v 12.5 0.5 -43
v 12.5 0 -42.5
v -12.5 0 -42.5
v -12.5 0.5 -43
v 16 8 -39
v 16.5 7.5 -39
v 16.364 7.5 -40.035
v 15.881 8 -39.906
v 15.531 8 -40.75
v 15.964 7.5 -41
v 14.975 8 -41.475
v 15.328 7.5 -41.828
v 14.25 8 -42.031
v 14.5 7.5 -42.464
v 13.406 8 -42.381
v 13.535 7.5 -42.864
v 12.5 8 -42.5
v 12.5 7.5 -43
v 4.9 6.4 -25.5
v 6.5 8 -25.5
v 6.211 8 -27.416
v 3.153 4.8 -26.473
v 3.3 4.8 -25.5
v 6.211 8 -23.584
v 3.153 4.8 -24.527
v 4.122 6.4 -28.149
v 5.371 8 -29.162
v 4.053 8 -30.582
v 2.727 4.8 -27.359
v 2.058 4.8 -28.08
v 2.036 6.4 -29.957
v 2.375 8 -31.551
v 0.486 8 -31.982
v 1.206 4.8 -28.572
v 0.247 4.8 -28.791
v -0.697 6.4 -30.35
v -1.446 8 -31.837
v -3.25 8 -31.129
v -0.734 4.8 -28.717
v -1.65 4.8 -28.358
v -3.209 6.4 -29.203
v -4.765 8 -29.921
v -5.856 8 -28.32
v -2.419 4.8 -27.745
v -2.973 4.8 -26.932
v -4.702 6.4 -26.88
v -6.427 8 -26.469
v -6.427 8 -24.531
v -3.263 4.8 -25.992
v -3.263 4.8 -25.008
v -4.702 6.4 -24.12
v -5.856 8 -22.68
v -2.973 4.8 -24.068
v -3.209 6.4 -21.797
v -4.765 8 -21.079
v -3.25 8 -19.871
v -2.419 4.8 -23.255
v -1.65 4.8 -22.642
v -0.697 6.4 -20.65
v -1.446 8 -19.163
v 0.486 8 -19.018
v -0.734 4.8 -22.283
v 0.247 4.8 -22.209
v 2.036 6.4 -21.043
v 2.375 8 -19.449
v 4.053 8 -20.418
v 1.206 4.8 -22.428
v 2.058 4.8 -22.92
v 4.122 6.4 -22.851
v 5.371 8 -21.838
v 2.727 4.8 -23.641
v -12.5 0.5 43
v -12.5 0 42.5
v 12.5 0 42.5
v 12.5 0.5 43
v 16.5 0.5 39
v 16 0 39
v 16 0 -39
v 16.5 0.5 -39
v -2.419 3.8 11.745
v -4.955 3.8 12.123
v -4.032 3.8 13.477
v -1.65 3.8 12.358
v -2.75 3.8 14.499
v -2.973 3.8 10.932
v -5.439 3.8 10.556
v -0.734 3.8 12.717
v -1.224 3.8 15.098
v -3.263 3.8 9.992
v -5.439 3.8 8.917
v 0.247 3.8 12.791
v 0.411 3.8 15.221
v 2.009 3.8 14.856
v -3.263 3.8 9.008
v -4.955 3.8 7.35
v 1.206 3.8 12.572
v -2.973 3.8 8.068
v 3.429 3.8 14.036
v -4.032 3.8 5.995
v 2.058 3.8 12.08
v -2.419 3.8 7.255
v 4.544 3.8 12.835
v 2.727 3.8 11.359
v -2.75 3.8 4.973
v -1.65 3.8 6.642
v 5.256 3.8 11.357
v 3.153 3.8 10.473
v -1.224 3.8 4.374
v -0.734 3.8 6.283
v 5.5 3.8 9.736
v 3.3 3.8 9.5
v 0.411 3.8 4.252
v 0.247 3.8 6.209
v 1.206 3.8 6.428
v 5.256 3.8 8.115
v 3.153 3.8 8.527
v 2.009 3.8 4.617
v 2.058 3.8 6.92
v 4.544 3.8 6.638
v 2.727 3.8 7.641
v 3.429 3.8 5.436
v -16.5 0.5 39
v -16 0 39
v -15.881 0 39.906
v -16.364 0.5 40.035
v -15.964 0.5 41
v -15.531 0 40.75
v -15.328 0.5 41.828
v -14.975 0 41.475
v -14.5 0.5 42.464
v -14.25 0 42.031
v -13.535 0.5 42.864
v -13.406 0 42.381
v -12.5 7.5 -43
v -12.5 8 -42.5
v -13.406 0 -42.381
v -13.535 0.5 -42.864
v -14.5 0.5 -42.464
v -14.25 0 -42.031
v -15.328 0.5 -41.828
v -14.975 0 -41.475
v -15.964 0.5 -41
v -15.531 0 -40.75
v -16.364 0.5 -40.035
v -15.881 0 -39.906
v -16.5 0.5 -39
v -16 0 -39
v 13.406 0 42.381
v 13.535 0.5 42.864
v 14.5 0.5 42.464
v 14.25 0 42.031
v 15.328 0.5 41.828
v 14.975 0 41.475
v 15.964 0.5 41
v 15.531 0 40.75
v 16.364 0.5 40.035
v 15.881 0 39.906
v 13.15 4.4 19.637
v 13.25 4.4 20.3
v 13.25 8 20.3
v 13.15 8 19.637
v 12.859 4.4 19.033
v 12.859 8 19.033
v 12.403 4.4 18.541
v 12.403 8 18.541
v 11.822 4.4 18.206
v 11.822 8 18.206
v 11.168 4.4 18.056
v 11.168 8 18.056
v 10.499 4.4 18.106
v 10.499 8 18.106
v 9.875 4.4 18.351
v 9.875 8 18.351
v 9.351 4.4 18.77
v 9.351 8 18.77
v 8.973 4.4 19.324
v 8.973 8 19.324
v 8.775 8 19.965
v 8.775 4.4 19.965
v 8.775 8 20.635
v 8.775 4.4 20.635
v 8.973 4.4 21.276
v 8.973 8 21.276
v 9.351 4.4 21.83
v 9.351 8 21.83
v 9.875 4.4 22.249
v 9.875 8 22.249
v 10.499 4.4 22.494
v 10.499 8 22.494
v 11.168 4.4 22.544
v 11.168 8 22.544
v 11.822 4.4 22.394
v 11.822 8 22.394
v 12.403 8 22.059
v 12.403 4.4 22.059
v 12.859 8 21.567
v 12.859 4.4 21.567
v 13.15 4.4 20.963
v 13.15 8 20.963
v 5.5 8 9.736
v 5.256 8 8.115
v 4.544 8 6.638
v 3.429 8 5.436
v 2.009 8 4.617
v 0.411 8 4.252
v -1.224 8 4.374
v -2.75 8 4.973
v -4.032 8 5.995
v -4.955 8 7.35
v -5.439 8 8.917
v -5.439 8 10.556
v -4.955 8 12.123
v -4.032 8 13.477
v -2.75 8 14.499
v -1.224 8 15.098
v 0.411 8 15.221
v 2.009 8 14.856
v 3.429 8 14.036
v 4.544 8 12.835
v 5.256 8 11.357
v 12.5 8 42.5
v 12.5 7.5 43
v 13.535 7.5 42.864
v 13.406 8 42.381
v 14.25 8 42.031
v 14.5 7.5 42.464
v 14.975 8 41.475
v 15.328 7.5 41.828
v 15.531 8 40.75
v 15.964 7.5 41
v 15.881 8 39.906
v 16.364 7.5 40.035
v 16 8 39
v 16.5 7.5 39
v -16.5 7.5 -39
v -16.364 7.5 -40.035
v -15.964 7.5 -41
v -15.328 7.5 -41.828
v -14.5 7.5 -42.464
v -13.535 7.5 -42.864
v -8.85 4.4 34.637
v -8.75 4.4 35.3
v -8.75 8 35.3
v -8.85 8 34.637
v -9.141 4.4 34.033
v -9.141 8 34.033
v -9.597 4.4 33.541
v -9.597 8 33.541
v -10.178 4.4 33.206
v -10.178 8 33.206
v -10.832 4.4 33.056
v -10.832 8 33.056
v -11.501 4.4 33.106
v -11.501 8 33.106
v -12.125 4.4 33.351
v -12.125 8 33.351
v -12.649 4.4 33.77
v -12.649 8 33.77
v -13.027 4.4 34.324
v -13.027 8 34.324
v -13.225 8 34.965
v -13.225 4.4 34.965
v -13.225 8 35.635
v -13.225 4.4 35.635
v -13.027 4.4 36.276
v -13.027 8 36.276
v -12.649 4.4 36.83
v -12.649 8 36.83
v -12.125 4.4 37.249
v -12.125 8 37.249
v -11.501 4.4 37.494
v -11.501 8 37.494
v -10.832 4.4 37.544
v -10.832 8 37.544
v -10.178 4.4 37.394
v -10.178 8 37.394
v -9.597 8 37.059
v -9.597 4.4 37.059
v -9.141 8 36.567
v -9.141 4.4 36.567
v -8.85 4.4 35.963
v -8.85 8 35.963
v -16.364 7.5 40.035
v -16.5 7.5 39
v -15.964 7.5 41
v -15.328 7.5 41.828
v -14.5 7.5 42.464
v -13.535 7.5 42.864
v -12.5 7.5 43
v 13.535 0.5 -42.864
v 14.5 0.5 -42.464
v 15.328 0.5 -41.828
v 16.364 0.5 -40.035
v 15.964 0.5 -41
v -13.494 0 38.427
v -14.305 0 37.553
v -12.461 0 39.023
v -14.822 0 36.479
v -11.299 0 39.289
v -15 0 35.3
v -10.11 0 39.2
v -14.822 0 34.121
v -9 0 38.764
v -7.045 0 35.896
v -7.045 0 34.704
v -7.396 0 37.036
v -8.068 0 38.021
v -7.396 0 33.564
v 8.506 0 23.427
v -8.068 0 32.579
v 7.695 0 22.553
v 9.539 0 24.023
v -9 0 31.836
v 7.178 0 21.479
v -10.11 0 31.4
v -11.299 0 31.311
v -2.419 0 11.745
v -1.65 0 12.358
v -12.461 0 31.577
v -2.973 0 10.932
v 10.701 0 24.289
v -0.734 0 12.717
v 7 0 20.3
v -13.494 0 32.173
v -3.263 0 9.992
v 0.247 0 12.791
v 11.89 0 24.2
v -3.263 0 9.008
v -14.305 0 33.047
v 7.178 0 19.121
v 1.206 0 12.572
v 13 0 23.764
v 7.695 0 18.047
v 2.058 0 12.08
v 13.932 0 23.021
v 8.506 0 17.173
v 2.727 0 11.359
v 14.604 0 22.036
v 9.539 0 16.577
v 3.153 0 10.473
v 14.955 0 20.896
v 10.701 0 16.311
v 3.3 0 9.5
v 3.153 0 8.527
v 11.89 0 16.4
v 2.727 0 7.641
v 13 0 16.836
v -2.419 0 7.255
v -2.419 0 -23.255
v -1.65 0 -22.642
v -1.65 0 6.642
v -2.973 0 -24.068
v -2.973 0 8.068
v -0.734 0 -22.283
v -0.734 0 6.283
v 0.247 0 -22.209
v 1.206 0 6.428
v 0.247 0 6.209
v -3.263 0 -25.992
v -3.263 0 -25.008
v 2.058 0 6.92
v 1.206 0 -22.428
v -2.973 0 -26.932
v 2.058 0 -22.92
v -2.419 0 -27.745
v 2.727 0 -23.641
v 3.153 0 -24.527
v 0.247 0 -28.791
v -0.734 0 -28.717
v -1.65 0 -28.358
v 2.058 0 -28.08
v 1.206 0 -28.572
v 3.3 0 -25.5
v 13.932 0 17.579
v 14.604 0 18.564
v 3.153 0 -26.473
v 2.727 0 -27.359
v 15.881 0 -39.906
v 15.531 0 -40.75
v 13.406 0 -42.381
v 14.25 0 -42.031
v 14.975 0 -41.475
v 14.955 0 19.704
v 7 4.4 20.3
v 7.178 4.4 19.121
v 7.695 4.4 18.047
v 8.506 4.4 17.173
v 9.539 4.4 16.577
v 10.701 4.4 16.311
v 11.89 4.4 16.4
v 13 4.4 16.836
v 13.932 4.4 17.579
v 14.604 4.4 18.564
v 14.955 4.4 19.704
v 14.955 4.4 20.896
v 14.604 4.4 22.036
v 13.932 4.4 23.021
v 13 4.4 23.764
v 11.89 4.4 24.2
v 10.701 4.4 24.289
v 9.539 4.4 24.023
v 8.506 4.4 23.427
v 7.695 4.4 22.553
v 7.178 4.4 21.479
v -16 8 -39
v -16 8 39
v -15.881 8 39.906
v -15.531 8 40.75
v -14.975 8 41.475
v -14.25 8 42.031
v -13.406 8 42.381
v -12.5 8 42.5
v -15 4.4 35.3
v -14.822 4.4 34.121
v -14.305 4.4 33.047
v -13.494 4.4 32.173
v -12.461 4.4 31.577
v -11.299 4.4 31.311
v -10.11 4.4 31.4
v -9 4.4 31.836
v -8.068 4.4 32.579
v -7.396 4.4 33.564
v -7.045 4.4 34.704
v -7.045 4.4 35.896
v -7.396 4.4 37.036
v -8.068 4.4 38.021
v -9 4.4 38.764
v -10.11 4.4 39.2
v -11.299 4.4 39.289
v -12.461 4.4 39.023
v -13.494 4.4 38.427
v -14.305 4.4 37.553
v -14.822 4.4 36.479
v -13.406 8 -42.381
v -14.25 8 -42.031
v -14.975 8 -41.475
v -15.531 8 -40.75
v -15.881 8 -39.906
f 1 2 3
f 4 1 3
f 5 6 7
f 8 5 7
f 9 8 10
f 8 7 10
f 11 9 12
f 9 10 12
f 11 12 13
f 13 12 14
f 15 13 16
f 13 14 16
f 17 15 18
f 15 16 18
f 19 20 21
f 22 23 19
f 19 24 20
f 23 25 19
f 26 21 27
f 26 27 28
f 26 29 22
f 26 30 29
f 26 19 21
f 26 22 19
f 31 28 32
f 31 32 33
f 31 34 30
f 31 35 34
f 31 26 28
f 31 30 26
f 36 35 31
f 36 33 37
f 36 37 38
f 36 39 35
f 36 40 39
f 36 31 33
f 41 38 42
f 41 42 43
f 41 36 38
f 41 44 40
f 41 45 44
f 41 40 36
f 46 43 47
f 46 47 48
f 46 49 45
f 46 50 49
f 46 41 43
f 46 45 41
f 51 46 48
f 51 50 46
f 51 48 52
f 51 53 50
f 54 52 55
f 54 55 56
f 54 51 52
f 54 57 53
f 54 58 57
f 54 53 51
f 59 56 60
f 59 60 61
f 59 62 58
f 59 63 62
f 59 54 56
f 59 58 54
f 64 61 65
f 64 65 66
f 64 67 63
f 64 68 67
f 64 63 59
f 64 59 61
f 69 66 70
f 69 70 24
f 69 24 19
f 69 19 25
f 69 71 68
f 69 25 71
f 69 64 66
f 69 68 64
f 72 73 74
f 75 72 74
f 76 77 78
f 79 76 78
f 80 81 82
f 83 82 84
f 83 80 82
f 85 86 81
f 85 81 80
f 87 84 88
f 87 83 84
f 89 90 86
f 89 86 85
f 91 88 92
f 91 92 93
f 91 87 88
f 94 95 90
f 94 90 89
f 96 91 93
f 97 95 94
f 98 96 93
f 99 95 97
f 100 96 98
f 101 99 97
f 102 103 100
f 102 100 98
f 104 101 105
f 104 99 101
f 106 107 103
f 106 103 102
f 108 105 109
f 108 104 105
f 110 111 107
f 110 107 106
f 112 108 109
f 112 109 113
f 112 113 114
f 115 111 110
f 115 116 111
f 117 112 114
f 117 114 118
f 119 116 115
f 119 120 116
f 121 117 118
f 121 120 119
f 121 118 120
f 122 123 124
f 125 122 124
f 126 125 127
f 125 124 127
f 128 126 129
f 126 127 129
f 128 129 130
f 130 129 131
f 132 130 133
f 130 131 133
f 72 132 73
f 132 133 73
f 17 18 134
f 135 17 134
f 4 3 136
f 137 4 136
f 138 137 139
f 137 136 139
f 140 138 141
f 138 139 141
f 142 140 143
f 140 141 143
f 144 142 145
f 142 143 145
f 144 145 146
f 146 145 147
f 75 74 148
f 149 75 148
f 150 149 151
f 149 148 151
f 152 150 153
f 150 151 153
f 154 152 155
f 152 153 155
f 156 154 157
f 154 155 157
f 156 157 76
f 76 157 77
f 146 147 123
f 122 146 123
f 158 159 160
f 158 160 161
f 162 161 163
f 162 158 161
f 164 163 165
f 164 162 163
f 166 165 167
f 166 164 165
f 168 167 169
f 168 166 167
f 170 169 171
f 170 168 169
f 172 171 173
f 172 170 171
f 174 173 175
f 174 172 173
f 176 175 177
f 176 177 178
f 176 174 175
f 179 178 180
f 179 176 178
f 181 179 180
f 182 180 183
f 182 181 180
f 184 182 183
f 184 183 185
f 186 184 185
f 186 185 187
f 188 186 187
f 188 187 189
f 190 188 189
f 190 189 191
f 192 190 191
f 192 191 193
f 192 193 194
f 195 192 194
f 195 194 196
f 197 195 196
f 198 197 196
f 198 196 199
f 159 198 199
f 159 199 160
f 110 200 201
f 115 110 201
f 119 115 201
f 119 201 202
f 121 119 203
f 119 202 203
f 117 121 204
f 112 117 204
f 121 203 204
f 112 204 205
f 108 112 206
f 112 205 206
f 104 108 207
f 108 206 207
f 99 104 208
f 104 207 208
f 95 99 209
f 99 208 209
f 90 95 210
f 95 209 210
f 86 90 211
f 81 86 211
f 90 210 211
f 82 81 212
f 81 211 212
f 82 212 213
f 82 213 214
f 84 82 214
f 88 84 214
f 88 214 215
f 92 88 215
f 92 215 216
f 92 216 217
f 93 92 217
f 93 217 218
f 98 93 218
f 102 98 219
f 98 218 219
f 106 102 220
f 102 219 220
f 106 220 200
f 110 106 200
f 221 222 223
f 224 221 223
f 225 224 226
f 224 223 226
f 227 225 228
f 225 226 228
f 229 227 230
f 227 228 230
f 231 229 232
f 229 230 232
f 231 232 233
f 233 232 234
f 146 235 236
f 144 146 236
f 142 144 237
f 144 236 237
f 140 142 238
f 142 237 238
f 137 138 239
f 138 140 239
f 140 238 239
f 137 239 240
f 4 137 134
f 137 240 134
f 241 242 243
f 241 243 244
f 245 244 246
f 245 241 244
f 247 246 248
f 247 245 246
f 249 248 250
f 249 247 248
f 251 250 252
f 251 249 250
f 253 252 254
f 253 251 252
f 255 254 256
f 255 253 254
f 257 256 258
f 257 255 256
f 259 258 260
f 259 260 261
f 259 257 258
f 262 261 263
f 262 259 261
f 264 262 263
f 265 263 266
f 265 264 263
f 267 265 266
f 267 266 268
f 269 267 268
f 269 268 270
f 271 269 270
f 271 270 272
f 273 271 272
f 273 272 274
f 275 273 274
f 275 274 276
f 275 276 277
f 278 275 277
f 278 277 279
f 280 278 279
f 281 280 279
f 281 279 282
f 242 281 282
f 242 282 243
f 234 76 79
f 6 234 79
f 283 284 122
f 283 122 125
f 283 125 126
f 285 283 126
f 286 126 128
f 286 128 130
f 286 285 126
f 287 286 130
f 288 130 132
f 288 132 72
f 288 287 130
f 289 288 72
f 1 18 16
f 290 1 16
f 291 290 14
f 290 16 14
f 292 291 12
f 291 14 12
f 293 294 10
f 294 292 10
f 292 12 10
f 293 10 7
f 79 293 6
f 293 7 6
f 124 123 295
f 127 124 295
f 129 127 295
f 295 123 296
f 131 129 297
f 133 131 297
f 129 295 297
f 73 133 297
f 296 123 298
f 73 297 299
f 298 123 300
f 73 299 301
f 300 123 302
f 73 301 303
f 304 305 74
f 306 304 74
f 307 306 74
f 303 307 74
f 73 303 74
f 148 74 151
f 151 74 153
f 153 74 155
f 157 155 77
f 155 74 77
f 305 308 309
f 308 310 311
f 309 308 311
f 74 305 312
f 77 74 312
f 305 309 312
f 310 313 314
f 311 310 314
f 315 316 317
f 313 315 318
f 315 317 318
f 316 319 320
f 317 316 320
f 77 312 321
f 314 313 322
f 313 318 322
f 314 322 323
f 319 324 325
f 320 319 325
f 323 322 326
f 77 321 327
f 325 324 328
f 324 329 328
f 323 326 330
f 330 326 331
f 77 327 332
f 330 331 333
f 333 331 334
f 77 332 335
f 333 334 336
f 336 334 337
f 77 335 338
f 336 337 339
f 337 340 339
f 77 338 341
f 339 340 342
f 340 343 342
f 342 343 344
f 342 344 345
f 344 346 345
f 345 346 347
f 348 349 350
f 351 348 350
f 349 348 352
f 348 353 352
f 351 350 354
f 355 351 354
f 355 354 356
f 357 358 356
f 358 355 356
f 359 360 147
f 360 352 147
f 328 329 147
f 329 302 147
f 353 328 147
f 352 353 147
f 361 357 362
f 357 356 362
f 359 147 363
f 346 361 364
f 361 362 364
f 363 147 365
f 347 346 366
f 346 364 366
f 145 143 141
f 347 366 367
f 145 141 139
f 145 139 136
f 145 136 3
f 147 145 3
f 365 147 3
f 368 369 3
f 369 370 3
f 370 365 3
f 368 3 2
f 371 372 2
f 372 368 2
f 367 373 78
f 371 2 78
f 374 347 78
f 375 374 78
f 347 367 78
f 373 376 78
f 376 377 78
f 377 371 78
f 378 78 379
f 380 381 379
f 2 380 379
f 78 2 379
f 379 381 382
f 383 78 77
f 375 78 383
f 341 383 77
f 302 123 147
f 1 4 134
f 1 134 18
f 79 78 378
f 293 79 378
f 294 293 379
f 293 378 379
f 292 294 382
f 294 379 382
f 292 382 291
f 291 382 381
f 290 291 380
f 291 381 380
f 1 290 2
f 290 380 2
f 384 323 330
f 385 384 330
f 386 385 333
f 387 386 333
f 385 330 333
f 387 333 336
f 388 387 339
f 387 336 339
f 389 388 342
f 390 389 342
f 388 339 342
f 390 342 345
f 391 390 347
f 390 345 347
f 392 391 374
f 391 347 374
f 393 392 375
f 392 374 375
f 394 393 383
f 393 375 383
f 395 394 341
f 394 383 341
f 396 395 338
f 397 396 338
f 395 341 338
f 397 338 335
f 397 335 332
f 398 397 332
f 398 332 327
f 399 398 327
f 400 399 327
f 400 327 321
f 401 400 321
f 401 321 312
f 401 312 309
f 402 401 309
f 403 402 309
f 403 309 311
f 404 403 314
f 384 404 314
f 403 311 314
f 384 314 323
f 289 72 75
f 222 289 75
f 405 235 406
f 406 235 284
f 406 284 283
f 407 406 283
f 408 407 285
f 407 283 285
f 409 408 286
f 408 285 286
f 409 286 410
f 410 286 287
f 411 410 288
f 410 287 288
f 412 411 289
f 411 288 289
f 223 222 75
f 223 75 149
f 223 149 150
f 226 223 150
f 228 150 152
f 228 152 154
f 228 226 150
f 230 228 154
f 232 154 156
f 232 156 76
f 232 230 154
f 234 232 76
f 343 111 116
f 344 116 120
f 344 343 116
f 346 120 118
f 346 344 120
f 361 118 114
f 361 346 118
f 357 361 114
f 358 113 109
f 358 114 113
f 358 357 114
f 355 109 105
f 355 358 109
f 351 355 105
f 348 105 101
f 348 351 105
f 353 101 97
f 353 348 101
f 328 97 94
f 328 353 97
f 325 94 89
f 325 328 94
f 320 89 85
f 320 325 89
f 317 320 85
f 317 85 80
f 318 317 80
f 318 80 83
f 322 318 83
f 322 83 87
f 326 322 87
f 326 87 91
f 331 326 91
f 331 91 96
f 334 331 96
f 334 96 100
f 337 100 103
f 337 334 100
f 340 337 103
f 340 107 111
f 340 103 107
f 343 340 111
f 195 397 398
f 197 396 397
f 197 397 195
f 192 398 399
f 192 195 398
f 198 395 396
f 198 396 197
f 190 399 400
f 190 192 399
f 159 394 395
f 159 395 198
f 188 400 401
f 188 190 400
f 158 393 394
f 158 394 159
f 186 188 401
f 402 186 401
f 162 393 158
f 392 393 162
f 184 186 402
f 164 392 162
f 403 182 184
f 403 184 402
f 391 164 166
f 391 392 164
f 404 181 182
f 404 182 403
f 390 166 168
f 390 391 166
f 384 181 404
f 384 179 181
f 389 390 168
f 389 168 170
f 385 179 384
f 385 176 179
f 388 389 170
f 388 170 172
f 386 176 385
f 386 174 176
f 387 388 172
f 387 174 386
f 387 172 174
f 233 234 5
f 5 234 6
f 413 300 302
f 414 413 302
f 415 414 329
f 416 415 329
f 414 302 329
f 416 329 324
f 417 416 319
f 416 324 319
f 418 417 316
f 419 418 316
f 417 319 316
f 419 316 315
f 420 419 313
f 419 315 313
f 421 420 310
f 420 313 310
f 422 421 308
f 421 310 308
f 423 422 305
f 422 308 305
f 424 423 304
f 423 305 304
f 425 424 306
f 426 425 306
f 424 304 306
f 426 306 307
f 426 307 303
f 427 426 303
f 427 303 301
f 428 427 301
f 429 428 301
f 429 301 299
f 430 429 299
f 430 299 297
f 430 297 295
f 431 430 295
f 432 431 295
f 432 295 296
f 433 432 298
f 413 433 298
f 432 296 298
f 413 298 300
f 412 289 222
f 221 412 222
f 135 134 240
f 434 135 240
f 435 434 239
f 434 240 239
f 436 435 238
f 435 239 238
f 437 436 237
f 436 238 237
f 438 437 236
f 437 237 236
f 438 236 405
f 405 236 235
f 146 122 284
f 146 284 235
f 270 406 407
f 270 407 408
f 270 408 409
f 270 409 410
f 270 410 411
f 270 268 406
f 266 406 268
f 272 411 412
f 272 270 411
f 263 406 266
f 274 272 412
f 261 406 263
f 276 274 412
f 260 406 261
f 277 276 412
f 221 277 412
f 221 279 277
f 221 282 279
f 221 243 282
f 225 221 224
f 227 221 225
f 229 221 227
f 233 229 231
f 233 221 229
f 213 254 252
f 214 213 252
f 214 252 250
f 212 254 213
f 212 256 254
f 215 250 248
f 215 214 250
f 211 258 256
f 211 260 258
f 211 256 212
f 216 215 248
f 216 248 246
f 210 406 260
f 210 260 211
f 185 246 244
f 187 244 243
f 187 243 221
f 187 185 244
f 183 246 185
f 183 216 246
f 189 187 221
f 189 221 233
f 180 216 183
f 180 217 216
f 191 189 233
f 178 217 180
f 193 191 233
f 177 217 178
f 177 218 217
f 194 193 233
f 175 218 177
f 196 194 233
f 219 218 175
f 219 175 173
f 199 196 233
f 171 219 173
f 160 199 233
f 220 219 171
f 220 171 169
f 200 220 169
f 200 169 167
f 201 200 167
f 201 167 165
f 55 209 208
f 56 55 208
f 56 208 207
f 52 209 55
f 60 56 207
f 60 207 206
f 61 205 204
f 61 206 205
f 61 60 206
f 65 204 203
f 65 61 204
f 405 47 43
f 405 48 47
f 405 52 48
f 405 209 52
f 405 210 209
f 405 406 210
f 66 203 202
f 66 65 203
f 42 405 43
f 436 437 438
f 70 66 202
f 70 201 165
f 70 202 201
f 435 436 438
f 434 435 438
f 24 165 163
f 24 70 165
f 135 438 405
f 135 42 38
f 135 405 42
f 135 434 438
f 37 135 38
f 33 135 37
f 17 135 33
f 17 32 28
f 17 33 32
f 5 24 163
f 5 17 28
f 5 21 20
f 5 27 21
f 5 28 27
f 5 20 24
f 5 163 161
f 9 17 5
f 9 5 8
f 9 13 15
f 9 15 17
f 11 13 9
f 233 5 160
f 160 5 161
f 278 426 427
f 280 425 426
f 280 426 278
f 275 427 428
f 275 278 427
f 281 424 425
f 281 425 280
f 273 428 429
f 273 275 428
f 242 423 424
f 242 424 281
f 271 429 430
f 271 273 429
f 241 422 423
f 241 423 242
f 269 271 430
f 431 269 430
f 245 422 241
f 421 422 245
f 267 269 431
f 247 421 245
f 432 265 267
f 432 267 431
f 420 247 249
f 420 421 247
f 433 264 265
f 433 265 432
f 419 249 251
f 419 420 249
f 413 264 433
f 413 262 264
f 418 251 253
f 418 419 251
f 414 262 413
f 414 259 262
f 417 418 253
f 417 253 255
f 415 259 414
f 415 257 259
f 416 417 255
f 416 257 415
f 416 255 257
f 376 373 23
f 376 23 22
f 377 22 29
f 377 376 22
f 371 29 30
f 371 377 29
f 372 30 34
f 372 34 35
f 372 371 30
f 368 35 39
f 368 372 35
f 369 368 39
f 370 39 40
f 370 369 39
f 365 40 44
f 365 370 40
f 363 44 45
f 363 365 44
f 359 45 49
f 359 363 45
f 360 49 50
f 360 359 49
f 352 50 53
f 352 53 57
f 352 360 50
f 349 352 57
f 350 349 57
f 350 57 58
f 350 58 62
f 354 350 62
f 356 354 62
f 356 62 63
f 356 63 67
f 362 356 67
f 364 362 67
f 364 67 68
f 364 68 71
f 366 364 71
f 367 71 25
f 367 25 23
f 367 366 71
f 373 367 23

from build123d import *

# Parameters (mm, degrees)
SKETCH3_W           = 33
SKETCH3_H           = 86
SKETCH3_R           = 3.3
SKETCH3_R_2         = 2.25
BOSS_EXTRUDE2_DEPTH = 8
SKETCH4_R           = 5.5
CUT_EXTRUDE2_DEPTH  = 4.2
CHAMFER1_SIZE       = 3.2
SKETCH5_R           = 4
CUT_EXTRUDE3_DEPTH  = 4.4
FILLET1_R           = 4
CHAMFER2_SIZE       = 0.5


with BuildPart() as part:
    # Sketch3 → Boss-Extrude2 (new body)
    with BuildSketch(Plane(origin=(0, 0, 0), x_dir=(1, 0, 0), z_dir=(0, 1, 0))):
        Rectangle(SKETCH3_W, SKETCH3_H)
        with Locations((0, 25.5)):
            Circle(SKETCH3_R, mode=Mode.SUBTRACT)
        with Locations((0, -9.5)):
            Circle(SKETCH3_R, mode=Mode.SUBTRACT)
        with Locations((11, -20.3)):
            Circle(SKETCH3_R_2, mode=Mode.SUBTRACT)
        with Locations((-11, -35.3)):
            Circle(SKETCH3_R_2, mode=Mode.SUBTRACT)
    extrude(amount=BOSS_EXTRUDE2_DEPTH)

    # Sketch4 → Cut-Extrude2 (cut)
    with BuildSketch(Plane(origin=(0, 8, 0), x_dir=(1, 0, 0), z_dir=(0, 1, 0))):
        with Locations((0, -9.736308316)):
            Circle(SKETCH4_R)
    extrude(amount=-CUT_EXTRUDE2_DEPTH, mode=Mode.SUBTRACT)

    # Chamfer1
    chamfer1_edges = [part.edges().sort_by_distance(p)[0] for p in [
        (-3.3, 8, -25.5),
    ]]
    chamfer(chamfer1_edges, length=CHAMFER1_SIZE)

    # Sketch5 → Cut-Extrude3 (cut)
    with BuildSketch(Plane(origin=(0, 0, 0), x_dir=(-1, 0, 0), z_dir=(0, -1, 0))):
        with Locations((11, -35.3)):
            Circle(SKETCH5_R)
        with Locations((-11, -20.3)):
            Circle(SKETCH5_R)
    extrude(amount=-CUT_EXTRUDE3_DEPTH, mode=Mode.SUBTRACT)

    # Fillet1
    fillet1_edges = [part.edges().sort_by_distance(p)[0] for p in [
        (16.5, 4, 43),
        (-16.5, 4, 43),
        (-16.5, 4, -43),
        (16.5, 4, -43),
    ]]
    fillet(fillet1_edges, radius=FILLET1_R)

    # Chamfer2
    chamfer2_edges = [part.edges().sort_by_distance(p)[0] for p in [
        (16.5, 0, 0),
        (16.5, 8, 0),
        (0, 0, 43),
        (-16.5, 0, 0),
        (0, 0, -43),
        (15.328427125, 0, -41.828427125),
        (-15.328427125, 0, -41.828427125),
        (-15.328427125, 0, 41.828427125),
        (15.328427125, 0, 41.828427125),
        (0, 8, 43),
        (0, 8, -43),
        (-16.5, 8, 0),
        (15.328427125, 8, -41.828427125),
        (-15.328427125, 8, -41.828427125),
        (-15.328427125, 8, 41.828427125),
        (15.328427125, 8, 41.828427125),
    ]]
    chamfer(chamfer2_edges, length=CHAMFER2_SIZE)


solid = part.part
